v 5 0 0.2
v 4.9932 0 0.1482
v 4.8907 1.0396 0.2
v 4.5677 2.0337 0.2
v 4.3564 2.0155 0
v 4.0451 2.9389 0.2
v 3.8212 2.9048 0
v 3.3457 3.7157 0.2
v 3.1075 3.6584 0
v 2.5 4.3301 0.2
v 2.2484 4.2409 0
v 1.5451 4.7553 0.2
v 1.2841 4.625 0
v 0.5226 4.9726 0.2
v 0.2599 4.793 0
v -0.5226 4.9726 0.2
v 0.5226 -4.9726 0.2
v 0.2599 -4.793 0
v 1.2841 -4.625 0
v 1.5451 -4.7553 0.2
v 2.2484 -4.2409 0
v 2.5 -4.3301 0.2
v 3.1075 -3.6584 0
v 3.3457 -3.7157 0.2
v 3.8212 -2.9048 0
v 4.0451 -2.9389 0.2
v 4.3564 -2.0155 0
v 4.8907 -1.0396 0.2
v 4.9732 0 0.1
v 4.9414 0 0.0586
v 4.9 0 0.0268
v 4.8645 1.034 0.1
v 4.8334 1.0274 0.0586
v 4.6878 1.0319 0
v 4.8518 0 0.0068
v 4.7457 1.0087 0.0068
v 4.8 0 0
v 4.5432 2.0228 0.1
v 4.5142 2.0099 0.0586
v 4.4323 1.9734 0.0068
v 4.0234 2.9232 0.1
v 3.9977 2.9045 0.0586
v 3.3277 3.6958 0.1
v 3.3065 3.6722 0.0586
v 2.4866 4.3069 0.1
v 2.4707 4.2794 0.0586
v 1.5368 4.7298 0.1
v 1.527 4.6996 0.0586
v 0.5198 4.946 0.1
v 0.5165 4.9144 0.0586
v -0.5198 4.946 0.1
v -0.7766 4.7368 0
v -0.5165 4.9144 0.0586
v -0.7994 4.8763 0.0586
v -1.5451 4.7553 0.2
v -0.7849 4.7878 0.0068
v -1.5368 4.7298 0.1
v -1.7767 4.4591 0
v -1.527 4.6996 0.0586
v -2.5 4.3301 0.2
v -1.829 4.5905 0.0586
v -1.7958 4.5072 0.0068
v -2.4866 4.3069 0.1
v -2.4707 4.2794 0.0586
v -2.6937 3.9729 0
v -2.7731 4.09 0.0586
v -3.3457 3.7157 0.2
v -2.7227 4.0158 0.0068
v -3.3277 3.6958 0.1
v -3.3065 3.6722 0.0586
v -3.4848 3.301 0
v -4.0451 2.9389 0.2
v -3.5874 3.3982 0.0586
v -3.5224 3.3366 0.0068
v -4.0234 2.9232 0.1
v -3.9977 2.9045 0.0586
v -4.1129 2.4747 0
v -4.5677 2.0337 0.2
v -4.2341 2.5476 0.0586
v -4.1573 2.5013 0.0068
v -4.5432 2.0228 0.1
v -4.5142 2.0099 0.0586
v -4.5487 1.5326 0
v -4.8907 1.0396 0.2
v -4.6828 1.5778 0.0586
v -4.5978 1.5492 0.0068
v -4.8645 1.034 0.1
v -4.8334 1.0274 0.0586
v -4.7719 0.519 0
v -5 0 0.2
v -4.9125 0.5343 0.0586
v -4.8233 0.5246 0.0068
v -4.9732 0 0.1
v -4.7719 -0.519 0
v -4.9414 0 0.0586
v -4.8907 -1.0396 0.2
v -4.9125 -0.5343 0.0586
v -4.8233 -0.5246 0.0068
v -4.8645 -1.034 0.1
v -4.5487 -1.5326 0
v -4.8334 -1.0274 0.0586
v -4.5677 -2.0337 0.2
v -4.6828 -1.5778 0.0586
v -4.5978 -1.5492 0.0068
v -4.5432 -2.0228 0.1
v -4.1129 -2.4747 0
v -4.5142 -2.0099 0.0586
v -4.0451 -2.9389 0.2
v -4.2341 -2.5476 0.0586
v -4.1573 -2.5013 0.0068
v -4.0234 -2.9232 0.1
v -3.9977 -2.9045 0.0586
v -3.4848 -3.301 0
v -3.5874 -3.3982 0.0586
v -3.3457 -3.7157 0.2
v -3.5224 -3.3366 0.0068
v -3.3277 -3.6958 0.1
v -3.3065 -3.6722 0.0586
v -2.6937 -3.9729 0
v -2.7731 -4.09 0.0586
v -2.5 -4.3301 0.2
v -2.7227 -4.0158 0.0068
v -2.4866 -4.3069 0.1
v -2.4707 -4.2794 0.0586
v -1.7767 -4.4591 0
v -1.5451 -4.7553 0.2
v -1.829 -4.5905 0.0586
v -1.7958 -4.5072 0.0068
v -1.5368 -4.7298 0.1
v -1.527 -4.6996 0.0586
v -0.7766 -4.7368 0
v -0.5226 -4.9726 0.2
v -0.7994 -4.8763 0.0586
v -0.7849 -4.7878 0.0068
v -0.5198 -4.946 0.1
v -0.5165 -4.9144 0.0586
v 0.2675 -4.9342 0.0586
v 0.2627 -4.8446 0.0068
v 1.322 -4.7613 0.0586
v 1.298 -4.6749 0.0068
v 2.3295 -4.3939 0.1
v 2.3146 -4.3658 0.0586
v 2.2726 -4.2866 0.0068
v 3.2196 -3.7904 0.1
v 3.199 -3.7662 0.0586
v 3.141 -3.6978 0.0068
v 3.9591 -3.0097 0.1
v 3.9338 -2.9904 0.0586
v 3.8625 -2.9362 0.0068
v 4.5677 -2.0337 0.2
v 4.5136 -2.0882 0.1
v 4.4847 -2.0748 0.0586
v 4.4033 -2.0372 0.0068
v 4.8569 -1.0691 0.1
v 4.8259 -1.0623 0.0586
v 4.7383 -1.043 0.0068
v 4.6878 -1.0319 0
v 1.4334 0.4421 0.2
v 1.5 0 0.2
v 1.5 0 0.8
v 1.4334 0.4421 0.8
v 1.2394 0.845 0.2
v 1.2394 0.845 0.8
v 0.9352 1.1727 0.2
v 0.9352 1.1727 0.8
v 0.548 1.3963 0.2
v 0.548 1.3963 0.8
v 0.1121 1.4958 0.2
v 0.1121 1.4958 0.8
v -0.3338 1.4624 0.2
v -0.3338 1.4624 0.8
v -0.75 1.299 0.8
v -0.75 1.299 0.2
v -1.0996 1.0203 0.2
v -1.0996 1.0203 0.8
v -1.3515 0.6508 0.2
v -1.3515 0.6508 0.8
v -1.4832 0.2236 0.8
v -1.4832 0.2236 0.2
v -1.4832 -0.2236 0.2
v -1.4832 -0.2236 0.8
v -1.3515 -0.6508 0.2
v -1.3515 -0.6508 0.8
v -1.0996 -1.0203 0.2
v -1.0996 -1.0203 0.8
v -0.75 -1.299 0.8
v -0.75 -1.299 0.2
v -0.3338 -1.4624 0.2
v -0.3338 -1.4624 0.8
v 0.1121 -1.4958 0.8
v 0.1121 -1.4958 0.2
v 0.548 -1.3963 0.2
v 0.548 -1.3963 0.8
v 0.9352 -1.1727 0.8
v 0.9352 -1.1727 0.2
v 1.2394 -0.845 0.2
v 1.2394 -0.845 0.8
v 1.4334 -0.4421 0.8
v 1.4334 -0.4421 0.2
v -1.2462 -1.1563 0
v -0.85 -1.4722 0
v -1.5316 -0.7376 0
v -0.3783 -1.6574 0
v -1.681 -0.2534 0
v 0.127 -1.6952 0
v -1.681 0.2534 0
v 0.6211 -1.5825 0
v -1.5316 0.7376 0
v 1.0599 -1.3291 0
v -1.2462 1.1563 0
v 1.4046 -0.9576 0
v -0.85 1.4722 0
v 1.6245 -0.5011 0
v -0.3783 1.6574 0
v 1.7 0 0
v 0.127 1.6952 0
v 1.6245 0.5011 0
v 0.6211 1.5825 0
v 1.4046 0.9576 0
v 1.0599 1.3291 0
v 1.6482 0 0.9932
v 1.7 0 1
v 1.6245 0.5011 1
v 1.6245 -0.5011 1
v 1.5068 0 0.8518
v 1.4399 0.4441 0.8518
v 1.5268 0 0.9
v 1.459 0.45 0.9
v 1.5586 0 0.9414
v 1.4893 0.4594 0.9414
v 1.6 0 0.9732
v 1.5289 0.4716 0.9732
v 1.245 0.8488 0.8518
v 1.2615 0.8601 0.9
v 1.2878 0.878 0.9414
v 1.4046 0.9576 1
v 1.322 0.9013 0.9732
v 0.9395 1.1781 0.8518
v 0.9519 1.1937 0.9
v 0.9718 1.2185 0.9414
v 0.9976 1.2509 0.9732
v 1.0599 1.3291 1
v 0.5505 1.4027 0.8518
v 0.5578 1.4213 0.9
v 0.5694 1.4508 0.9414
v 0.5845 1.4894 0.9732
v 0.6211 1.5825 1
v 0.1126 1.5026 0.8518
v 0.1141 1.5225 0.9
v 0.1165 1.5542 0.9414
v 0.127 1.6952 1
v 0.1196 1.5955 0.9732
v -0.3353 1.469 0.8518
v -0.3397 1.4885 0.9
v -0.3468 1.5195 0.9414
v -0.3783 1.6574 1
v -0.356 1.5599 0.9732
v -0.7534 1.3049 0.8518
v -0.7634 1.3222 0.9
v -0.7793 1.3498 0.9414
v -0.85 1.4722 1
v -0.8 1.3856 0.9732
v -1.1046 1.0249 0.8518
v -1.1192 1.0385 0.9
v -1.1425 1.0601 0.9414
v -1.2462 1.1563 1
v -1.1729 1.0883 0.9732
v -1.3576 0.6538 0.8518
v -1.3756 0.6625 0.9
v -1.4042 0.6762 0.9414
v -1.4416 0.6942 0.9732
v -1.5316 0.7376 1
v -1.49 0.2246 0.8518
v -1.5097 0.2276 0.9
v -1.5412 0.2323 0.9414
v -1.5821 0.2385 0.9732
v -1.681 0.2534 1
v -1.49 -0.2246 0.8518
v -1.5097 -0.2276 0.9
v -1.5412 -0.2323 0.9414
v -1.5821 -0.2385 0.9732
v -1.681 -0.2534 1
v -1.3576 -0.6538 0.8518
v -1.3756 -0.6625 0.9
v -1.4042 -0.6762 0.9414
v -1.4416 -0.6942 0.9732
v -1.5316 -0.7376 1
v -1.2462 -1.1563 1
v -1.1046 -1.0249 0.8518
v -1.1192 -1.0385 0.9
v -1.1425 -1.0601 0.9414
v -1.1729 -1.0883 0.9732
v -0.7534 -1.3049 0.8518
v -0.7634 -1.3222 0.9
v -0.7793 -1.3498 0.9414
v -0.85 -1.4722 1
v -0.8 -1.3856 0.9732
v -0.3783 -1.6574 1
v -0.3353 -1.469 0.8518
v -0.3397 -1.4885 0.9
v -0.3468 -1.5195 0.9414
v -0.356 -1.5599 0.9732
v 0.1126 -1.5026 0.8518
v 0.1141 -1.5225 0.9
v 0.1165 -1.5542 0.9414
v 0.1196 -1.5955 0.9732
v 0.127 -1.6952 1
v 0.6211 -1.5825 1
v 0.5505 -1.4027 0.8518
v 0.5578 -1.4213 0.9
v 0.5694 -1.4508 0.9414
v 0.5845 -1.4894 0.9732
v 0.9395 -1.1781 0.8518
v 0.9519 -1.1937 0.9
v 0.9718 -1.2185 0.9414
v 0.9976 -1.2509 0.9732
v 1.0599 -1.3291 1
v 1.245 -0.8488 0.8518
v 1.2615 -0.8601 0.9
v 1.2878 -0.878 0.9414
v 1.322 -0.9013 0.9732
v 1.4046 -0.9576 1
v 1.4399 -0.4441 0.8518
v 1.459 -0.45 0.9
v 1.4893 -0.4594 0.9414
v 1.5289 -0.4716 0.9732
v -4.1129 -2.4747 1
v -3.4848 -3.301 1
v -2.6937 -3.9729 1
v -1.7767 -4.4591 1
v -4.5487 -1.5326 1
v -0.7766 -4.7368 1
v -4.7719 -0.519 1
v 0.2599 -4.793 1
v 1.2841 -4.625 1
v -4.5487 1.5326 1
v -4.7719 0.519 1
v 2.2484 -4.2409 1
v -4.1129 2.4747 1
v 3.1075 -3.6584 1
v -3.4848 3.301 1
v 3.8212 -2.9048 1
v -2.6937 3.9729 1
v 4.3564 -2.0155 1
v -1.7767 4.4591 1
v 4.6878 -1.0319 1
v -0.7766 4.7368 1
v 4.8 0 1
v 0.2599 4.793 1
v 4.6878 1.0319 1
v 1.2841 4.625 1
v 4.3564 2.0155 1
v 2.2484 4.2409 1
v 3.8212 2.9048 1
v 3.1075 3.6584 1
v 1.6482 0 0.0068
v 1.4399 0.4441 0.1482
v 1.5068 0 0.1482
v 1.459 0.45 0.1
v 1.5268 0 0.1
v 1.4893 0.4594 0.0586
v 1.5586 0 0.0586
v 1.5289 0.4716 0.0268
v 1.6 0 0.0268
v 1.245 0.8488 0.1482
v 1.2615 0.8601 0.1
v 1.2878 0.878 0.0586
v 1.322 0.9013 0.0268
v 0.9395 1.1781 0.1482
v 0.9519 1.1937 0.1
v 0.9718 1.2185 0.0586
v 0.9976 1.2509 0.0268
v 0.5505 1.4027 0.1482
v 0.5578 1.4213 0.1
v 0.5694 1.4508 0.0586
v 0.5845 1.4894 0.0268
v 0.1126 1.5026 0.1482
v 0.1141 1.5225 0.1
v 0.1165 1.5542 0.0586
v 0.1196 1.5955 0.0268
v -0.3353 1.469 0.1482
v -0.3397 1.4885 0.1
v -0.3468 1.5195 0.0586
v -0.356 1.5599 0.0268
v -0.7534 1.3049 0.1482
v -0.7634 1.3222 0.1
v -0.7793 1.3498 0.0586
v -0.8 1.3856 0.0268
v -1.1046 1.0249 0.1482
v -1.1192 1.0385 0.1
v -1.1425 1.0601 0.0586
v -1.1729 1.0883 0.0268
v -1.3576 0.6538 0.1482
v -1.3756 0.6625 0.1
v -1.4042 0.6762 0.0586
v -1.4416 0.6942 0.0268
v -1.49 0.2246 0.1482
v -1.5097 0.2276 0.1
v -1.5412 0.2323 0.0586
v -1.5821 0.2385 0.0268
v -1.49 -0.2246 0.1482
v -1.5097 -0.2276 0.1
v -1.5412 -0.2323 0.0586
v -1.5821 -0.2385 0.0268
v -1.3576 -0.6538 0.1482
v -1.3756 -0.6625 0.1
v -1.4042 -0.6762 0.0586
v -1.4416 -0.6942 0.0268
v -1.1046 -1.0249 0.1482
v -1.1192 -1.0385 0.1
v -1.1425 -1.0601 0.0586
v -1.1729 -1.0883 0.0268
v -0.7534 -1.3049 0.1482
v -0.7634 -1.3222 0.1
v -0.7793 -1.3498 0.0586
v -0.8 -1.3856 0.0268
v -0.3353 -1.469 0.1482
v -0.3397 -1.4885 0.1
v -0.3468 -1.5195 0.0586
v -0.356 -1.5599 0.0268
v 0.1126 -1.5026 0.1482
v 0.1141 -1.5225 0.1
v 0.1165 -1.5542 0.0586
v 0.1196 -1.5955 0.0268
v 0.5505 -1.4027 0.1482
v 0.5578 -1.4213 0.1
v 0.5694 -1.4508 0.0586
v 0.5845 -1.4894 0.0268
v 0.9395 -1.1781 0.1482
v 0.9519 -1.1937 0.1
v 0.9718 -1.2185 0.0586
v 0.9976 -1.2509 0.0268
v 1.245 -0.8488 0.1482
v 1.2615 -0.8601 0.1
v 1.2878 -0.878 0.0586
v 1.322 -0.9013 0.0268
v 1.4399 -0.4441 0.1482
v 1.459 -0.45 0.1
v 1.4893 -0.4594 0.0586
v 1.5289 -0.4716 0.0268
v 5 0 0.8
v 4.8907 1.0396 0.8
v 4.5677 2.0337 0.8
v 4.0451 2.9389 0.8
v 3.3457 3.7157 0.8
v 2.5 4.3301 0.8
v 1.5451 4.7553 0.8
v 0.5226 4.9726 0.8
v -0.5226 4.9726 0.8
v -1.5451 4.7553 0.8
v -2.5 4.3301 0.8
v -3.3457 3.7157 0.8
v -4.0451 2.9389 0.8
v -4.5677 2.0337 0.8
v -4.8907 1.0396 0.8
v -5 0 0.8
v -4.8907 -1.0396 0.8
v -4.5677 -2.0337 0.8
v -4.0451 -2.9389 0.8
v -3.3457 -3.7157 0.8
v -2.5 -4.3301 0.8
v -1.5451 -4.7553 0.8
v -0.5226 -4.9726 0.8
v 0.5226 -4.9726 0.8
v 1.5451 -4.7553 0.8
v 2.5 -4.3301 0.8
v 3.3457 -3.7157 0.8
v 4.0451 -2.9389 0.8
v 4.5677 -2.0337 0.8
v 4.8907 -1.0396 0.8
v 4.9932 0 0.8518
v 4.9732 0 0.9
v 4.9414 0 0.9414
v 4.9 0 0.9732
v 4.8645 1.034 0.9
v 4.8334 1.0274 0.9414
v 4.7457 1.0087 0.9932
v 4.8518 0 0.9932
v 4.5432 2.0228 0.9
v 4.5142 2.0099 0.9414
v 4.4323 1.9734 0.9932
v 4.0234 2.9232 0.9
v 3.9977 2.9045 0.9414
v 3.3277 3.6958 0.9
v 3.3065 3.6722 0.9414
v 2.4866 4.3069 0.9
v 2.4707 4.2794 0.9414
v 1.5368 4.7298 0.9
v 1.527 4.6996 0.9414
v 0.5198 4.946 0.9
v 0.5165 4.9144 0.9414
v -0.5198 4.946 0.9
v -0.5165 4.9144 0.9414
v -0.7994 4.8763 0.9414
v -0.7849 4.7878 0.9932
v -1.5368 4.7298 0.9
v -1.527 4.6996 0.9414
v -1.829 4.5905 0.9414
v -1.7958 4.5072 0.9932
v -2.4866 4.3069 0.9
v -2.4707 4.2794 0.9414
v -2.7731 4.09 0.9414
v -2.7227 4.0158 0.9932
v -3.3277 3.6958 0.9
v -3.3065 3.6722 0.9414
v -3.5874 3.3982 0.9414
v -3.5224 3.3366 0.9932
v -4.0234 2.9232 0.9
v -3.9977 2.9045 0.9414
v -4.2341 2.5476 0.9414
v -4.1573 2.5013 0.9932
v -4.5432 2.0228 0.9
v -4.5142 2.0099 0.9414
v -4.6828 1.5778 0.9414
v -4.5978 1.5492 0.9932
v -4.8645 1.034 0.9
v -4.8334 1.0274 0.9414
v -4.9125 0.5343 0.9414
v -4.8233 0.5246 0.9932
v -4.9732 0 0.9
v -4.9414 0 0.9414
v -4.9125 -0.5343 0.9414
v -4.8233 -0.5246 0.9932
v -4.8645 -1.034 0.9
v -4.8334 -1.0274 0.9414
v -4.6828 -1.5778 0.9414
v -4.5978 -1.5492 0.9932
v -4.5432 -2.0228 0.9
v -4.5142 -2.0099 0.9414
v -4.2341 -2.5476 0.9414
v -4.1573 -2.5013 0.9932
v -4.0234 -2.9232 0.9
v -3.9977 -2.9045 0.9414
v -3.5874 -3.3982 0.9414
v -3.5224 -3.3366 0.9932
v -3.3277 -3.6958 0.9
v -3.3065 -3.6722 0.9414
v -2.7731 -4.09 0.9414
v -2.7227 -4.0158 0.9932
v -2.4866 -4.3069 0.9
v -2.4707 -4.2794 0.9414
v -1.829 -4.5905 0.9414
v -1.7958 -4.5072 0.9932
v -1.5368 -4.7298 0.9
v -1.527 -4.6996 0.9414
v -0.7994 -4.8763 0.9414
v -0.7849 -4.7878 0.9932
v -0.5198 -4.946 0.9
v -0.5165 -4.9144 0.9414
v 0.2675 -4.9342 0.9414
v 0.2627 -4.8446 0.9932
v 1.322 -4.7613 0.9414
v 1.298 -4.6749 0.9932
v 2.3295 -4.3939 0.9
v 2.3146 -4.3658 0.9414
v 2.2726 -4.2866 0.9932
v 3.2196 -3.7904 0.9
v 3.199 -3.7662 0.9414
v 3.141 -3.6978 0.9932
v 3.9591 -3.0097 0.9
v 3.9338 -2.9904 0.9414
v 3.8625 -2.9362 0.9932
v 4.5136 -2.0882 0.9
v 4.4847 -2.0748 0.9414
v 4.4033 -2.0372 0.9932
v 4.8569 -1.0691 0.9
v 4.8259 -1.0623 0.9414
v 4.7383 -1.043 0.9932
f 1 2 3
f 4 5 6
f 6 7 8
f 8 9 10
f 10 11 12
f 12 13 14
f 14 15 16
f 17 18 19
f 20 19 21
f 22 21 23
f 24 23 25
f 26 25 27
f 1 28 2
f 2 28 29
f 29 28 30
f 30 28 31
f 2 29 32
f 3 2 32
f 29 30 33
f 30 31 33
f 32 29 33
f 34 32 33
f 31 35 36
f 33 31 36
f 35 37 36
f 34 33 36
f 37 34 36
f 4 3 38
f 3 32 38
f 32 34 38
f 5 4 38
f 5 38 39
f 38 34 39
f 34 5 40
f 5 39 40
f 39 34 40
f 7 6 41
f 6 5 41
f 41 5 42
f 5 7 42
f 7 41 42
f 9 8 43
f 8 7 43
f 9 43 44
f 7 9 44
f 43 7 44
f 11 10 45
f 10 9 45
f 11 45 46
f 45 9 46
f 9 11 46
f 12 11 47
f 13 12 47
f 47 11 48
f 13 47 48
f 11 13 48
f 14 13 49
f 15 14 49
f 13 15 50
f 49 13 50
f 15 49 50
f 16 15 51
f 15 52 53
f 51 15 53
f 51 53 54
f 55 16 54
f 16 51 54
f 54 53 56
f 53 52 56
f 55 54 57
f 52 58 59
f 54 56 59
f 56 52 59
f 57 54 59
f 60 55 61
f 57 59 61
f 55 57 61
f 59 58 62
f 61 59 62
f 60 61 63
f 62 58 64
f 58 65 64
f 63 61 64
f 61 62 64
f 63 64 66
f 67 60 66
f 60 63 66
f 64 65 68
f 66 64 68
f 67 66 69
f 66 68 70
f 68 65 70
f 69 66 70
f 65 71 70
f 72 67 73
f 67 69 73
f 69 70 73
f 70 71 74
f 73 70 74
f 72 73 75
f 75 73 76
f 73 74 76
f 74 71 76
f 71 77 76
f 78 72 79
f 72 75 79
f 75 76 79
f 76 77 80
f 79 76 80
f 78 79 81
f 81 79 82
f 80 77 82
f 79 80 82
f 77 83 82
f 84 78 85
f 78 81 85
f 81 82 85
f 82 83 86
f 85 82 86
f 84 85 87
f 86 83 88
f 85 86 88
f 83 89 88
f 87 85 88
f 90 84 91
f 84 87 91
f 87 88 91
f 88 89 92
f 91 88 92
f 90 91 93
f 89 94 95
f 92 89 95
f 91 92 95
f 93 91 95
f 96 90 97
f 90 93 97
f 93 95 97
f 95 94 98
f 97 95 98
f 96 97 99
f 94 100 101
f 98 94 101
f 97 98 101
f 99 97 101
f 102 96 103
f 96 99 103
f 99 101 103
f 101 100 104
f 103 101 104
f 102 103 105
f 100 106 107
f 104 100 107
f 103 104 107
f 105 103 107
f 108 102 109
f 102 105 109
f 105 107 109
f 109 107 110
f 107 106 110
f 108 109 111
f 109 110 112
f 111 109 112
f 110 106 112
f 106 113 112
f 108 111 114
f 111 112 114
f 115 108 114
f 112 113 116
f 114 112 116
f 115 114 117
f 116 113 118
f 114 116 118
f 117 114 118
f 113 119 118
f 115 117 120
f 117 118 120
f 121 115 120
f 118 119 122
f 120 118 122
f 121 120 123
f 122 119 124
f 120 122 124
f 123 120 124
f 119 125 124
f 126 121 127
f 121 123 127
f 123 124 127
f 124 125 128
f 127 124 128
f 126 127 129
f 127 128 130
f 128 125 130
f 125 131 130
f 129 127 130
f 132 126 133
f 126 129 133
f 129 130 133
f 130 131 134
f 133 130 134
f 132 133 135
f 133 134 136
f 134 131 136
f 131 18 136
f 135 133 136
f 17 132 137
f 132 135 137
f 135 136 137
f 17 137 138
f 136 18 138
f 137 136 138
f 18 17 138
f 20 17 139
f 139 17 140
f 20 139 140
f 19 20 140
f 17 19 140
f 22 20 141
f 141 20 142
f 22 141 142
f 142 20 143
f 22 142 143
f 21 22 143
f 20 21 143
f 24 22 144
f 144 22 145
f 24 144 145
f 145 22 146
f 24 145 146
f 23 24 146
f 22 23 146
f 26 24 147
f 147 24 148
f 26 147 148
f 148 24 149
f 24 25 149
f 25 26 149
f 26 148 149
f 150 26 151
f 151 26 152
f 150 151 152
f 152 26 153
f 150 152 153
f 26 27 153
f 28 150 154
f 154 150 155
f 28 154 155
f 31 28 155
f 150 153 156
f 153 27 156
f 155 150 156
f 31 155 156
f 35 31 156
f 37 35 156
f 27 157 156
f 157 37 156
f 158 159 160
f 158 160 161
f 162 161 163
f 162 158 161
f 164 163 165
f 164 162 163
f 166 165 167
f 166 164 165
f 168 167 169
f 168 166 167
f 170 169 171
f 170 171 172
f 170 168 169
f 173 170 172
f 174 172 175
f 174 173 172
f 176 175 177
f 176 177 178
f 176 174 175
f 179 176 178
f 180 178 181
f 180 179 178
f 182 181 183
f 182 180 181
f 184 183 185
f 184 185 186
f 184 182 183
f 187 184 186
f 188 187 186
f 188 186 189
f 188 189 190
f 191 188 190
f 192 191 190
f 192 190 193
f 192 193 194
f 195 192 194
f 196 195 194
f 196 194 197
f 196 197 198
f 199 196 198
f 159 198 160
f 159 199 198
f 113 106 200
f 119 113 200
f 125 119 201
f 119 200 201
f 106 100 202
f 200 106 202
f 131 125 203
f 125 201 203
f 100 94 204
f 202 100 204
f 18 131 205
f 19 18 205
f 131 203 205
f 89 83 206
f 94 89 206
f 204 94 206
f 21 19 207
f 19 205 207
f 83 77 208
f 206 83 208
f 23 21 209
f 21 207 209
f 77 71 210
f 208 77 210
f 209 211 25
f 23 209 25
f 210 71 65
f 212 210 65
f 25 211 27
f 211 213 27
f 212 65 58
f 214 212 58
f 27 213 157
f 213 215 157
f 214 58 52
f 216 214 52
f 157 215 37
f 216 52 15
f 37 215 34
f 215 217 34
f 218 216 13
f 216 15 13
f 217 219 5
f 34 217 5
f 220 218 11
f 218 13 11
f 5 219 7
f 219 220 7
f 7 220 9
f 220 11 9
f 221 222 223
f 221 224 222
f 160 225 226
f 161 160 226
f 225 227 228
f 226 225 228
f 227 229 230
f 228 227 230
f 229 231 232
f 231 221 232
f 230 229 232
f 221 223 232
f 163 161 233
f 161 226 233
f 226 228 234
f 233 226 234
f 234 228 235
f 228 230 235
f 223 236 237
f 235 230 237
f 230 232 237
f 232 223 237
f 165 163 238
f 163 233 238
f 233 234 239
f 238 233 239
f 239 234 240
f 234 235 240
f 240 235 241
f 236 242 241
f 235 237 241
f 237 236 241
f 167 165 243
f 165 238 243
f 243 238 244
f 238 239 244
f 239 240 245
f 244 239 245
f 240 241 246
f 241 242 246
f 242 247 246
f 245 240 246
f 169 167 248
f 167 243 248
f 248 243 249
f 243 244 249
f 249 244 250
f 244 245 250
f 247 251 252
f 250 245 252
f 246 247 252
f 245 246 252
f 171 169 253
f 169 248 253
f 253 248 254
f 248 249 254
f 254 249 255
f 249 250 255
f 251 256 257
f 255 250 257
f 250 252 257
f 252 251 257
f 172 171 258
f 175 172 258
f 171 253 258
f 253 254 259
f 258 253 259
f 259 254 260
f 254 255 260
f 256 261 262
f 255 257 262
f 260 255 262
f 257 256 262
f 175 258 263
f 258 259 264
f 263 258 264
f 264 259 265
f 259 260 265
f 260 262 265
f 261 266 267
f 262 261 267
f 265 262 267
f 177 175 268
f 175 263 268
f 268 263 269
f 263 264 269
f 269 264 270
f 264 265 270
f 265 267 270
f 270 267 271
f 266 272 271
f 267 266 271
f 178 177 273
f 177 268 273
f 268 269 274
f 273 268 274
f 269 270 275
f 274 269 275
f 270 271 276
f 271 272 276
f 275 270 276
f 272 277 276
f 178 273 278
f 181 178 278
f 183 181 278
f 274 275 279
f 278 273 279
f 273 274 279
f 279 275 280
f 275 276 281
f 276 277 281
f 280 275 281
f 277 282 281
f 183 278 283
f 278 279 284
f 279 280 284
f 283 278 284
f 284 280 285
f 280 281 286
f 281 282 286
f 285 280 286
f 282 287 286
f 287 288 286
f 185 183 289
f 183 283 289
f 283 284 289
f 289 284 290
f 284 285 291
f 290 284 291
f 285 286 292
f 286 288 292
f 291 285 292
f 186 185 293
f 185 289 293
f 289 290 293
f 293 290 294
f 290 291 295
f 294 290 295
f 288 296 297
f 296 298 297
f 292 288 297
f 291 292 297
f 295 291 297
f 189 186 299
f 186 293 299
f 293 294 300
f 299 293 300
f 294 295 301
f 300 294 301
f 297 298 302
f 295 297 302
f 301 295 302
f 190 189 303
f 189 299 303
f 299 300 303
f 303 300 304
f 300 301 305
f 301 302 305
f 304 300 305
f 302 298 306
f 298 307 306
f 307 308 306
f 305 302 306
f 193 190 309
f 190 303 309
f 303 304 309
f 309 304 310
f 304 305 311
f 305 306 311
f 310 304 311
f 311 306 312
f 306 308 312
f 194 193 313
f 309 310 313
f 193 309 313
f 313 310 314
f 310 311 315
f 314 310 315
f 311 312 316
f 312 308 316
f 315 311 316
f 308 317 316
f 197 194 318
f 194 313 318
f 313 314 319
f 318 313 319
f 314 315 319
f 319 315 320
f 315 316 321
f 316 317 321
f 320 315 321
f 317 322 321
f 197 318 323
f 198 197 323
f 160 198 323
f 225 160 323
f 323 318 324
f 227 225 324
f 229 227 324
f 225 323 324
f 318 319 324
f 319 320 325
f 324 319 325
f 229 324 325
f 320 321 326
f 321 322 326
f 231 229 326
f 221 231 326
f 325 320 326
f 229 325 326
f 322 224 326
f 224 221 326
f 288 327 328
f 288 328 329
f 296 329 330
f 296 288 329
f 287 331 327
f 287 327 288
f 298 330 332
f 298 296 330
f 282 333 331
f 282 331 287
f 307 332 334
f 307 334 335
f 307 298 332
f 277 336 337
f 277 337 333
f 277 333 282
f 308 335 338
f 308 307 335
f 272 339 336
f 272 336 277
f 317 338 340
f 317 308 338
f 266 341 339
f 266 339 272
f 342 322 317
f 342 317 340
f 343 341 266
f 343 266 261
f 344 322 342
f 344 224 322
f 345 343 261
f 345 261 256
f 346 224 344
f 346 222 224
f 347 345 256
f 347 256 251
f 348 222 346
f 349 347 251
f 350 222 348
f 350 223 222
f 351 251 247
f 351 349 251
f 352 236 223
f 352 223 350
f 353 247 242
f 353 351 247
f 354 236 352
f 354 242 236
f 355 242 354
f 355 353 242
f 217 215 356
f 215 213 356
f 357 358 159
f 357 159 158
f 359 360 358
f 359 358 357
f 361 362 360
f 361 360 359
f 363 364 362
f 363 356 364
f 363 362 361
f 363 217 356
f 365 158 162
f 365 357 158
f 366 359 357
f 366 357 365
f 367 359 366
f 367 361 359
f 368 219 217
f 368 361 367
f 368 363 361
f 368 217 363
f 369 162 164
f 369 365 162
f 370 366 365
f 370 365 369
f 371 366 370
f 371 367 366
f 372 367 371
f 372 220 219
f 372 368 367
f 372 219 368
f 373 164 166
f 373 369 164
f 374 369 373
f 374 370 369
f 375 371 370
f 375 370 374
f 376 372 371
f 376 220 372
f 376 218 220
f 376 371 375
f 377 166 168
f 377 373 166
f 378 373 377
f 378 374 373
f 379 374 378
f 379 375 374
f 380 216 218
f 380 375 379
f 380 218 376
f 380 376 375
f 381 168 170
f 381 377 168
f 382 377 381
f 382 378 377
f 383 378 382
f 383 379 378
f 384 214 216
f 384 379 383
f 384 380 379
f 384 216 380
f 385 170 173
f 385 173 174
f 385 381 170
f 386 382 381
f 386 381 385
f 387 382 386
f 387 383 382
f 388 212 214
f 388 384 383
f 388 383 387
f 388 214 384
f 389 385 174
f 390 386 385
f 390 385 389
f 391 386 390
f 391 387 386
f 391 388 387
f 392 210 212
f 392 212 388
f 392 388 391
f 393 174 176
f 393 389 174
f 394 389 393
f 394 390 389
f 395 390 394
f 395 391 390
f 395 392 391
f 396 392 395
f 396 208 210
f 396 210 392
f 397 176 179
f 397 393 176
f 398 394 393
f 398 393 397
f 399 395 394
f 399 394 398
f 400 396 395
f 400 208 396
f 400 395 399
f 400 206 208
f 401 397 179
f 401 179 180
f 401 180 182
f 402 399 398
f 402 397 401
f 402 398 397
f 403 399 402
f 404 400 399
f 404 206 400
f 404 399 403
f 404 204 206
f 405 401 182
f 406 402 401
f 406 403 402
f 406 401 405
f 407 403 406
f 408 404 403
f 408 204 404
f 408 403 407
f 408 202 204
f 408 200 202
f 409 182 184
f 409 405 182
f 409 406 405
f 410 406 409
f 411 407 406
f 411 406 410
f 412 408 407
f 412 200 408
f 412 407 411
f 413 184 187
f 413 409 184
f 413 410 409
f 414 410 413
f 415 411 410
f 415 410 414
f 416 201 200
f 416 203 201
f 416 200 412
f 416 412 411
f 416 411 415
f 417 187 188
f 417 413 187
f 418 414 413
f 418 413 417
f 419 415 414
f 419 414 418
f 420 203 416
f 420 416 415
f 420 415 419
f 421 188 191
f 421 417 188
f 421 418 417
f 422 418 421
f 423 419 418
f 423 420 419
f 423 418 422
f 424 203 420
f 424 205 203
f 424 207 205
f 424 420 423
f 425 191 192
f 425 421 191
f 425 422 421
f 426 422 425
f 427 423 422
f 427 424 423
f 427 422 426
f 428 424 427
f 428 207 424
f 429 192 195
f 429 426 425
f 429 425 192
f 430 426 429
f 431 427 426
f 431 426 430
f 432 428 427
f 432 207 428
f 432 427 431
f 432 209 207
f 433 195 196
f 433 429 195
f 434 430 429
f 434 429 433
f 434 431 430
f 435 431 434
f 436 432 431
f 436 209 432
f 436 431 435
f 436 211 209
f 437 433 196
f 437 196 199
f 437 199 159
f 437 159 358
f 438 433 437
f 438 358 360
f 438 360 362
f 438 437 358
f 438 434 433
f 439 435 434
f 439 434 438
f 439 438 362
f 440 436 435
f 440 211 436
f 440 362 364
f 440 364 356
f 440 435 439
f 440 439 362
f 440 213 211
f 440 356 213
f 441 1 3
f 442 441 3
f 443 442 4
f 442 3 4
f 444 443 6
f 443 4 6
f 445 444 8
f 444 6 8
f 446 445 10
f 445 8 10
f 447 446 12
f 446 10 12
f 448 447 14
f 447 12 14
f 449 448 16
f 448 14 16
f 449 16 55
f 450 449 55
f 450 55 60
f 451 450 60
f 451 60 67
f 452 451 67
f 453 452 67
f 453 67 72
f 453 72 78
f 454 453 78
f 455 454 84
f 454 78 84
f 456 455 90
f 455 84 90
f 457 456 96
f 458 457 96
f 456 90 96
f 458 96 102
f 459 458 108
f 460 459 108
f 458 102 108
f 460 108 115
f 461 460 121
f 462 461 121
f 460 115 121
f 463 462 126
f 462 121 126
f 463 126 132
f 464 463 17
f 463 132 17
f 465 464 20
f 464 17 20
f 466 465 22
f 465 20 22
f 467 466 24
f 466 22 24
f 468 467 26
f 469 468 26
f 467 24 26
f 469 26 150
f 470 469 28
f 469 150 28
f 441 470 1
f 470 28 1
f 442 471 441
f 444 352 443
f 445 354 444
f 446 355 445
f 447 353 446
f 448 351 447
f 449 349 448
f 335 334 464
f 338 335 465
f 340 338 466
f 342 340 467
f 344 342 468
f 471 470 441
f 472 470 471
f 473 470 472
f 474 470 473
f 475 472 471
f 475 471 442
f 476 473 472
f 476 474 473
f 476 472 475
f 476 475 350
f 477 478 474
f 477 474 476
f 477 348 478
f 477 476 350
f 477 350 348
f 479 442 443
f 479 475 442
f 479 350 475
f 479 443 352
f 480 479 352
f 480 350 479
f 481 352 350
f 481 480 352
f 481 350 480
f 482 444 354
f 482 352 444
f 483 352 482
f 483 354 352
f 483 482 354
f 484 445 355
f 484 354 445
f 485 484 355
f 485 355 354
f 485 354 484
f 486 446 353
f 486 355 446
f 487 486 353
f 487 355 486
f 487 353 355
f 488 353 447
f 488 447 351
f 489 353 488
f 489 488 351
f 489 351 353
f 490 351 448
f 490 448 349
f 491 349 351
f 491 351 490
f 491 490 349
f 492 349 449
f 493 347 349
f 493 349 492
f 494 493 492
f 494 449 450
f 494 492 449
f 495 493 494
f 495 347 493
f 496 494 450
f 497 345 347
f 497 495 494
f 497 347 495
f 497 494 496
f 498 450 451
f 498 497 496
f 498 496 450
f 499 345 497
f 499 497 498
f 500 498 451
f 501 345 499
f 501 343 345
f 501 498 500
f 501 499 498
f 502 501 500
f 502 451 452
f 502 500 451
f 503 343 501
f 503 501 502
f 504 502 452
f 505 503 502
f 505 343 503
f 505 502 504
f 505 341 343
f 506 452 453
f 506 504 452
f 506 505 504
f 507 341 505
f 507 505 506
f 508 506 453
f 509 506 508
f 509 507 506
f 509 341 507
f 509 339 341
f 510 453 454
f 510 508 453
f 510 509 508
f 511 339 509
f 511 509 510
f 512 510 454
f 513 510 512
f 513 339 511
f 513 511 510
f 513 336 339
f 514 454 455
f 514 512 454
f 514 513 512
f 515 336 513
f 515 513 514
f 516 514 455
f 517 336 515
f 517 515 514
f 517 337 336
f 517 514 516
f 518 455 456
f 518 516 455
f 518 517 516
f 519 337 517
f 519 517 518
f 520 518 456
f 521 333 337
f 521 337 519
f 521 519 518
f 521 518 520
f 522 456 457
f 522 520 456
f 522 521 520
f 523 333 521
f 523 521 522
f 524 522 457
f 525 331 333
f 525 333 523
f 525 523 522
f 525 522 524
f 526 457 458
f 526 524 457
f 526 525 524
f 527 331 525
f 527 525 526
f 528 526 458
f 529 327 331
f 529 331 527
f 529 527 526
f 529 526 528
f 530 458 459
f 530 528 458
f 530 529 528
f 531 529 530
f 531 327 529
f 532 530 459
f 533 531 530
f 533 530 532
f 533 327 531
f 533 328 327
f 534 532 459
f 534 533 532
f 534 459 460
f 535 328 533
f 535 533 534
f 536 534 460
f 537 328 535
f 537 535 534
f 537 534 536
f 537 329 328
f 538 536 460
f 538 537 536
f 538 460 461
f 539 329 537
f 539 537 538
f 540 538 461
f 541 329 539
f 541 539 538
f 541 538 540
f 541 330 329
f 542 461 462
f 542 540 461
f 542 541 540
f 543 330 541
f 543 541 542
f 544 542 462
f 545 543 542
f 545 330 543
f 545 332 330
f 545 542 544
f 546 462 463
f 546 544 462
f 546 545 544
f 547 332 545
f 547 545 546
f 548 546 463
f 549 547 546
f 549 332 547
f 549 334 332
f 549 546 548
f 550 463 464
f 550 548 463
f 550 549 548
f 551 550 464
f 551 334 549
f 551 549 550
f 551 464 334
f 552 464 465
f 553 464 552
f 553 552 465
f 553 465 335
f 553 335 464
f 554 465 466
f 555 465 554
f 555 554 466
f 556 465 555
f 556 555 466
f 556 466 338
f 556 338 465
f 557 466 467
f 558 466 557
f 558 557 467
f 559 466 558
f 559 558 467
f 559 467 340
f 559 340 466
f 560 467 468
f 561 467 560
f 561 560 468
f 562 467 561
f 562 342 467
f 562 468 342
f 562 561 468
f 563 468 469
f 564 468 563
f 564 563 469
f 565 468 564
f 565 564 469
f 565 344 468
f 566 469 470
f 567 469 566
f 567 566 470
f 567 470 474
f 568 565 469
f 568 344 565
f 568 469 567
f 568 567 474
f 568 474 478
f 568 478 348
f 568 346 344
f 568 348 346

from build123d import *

# Parameters (mm, degrees)
F1_R     = 5
F1_R_2   = 1.5
F2_DEPTH = 1
F3_R     = 0.2


with BuildPart() as f2:
    # F1 (on offset) → F2 (new body)
    with BuildSketch(Plane.XY):
        Circle(F1_R)
        Circle(F1_R_2, mode=Mode.SUBTRACT)
    extrude(amount=F2_DEPTH)

    # F3
    f3_edges = [f2.edges().sort_by_distance(p)[0] for p in [
        (-5, 0, 1),
        (-1.5, 0, 1),
        (-5, 0, 0),
        (-1.5, 0, 0),
    ]]
    fillet(f3_edges, radius=F3_R)


solid = f2.part
